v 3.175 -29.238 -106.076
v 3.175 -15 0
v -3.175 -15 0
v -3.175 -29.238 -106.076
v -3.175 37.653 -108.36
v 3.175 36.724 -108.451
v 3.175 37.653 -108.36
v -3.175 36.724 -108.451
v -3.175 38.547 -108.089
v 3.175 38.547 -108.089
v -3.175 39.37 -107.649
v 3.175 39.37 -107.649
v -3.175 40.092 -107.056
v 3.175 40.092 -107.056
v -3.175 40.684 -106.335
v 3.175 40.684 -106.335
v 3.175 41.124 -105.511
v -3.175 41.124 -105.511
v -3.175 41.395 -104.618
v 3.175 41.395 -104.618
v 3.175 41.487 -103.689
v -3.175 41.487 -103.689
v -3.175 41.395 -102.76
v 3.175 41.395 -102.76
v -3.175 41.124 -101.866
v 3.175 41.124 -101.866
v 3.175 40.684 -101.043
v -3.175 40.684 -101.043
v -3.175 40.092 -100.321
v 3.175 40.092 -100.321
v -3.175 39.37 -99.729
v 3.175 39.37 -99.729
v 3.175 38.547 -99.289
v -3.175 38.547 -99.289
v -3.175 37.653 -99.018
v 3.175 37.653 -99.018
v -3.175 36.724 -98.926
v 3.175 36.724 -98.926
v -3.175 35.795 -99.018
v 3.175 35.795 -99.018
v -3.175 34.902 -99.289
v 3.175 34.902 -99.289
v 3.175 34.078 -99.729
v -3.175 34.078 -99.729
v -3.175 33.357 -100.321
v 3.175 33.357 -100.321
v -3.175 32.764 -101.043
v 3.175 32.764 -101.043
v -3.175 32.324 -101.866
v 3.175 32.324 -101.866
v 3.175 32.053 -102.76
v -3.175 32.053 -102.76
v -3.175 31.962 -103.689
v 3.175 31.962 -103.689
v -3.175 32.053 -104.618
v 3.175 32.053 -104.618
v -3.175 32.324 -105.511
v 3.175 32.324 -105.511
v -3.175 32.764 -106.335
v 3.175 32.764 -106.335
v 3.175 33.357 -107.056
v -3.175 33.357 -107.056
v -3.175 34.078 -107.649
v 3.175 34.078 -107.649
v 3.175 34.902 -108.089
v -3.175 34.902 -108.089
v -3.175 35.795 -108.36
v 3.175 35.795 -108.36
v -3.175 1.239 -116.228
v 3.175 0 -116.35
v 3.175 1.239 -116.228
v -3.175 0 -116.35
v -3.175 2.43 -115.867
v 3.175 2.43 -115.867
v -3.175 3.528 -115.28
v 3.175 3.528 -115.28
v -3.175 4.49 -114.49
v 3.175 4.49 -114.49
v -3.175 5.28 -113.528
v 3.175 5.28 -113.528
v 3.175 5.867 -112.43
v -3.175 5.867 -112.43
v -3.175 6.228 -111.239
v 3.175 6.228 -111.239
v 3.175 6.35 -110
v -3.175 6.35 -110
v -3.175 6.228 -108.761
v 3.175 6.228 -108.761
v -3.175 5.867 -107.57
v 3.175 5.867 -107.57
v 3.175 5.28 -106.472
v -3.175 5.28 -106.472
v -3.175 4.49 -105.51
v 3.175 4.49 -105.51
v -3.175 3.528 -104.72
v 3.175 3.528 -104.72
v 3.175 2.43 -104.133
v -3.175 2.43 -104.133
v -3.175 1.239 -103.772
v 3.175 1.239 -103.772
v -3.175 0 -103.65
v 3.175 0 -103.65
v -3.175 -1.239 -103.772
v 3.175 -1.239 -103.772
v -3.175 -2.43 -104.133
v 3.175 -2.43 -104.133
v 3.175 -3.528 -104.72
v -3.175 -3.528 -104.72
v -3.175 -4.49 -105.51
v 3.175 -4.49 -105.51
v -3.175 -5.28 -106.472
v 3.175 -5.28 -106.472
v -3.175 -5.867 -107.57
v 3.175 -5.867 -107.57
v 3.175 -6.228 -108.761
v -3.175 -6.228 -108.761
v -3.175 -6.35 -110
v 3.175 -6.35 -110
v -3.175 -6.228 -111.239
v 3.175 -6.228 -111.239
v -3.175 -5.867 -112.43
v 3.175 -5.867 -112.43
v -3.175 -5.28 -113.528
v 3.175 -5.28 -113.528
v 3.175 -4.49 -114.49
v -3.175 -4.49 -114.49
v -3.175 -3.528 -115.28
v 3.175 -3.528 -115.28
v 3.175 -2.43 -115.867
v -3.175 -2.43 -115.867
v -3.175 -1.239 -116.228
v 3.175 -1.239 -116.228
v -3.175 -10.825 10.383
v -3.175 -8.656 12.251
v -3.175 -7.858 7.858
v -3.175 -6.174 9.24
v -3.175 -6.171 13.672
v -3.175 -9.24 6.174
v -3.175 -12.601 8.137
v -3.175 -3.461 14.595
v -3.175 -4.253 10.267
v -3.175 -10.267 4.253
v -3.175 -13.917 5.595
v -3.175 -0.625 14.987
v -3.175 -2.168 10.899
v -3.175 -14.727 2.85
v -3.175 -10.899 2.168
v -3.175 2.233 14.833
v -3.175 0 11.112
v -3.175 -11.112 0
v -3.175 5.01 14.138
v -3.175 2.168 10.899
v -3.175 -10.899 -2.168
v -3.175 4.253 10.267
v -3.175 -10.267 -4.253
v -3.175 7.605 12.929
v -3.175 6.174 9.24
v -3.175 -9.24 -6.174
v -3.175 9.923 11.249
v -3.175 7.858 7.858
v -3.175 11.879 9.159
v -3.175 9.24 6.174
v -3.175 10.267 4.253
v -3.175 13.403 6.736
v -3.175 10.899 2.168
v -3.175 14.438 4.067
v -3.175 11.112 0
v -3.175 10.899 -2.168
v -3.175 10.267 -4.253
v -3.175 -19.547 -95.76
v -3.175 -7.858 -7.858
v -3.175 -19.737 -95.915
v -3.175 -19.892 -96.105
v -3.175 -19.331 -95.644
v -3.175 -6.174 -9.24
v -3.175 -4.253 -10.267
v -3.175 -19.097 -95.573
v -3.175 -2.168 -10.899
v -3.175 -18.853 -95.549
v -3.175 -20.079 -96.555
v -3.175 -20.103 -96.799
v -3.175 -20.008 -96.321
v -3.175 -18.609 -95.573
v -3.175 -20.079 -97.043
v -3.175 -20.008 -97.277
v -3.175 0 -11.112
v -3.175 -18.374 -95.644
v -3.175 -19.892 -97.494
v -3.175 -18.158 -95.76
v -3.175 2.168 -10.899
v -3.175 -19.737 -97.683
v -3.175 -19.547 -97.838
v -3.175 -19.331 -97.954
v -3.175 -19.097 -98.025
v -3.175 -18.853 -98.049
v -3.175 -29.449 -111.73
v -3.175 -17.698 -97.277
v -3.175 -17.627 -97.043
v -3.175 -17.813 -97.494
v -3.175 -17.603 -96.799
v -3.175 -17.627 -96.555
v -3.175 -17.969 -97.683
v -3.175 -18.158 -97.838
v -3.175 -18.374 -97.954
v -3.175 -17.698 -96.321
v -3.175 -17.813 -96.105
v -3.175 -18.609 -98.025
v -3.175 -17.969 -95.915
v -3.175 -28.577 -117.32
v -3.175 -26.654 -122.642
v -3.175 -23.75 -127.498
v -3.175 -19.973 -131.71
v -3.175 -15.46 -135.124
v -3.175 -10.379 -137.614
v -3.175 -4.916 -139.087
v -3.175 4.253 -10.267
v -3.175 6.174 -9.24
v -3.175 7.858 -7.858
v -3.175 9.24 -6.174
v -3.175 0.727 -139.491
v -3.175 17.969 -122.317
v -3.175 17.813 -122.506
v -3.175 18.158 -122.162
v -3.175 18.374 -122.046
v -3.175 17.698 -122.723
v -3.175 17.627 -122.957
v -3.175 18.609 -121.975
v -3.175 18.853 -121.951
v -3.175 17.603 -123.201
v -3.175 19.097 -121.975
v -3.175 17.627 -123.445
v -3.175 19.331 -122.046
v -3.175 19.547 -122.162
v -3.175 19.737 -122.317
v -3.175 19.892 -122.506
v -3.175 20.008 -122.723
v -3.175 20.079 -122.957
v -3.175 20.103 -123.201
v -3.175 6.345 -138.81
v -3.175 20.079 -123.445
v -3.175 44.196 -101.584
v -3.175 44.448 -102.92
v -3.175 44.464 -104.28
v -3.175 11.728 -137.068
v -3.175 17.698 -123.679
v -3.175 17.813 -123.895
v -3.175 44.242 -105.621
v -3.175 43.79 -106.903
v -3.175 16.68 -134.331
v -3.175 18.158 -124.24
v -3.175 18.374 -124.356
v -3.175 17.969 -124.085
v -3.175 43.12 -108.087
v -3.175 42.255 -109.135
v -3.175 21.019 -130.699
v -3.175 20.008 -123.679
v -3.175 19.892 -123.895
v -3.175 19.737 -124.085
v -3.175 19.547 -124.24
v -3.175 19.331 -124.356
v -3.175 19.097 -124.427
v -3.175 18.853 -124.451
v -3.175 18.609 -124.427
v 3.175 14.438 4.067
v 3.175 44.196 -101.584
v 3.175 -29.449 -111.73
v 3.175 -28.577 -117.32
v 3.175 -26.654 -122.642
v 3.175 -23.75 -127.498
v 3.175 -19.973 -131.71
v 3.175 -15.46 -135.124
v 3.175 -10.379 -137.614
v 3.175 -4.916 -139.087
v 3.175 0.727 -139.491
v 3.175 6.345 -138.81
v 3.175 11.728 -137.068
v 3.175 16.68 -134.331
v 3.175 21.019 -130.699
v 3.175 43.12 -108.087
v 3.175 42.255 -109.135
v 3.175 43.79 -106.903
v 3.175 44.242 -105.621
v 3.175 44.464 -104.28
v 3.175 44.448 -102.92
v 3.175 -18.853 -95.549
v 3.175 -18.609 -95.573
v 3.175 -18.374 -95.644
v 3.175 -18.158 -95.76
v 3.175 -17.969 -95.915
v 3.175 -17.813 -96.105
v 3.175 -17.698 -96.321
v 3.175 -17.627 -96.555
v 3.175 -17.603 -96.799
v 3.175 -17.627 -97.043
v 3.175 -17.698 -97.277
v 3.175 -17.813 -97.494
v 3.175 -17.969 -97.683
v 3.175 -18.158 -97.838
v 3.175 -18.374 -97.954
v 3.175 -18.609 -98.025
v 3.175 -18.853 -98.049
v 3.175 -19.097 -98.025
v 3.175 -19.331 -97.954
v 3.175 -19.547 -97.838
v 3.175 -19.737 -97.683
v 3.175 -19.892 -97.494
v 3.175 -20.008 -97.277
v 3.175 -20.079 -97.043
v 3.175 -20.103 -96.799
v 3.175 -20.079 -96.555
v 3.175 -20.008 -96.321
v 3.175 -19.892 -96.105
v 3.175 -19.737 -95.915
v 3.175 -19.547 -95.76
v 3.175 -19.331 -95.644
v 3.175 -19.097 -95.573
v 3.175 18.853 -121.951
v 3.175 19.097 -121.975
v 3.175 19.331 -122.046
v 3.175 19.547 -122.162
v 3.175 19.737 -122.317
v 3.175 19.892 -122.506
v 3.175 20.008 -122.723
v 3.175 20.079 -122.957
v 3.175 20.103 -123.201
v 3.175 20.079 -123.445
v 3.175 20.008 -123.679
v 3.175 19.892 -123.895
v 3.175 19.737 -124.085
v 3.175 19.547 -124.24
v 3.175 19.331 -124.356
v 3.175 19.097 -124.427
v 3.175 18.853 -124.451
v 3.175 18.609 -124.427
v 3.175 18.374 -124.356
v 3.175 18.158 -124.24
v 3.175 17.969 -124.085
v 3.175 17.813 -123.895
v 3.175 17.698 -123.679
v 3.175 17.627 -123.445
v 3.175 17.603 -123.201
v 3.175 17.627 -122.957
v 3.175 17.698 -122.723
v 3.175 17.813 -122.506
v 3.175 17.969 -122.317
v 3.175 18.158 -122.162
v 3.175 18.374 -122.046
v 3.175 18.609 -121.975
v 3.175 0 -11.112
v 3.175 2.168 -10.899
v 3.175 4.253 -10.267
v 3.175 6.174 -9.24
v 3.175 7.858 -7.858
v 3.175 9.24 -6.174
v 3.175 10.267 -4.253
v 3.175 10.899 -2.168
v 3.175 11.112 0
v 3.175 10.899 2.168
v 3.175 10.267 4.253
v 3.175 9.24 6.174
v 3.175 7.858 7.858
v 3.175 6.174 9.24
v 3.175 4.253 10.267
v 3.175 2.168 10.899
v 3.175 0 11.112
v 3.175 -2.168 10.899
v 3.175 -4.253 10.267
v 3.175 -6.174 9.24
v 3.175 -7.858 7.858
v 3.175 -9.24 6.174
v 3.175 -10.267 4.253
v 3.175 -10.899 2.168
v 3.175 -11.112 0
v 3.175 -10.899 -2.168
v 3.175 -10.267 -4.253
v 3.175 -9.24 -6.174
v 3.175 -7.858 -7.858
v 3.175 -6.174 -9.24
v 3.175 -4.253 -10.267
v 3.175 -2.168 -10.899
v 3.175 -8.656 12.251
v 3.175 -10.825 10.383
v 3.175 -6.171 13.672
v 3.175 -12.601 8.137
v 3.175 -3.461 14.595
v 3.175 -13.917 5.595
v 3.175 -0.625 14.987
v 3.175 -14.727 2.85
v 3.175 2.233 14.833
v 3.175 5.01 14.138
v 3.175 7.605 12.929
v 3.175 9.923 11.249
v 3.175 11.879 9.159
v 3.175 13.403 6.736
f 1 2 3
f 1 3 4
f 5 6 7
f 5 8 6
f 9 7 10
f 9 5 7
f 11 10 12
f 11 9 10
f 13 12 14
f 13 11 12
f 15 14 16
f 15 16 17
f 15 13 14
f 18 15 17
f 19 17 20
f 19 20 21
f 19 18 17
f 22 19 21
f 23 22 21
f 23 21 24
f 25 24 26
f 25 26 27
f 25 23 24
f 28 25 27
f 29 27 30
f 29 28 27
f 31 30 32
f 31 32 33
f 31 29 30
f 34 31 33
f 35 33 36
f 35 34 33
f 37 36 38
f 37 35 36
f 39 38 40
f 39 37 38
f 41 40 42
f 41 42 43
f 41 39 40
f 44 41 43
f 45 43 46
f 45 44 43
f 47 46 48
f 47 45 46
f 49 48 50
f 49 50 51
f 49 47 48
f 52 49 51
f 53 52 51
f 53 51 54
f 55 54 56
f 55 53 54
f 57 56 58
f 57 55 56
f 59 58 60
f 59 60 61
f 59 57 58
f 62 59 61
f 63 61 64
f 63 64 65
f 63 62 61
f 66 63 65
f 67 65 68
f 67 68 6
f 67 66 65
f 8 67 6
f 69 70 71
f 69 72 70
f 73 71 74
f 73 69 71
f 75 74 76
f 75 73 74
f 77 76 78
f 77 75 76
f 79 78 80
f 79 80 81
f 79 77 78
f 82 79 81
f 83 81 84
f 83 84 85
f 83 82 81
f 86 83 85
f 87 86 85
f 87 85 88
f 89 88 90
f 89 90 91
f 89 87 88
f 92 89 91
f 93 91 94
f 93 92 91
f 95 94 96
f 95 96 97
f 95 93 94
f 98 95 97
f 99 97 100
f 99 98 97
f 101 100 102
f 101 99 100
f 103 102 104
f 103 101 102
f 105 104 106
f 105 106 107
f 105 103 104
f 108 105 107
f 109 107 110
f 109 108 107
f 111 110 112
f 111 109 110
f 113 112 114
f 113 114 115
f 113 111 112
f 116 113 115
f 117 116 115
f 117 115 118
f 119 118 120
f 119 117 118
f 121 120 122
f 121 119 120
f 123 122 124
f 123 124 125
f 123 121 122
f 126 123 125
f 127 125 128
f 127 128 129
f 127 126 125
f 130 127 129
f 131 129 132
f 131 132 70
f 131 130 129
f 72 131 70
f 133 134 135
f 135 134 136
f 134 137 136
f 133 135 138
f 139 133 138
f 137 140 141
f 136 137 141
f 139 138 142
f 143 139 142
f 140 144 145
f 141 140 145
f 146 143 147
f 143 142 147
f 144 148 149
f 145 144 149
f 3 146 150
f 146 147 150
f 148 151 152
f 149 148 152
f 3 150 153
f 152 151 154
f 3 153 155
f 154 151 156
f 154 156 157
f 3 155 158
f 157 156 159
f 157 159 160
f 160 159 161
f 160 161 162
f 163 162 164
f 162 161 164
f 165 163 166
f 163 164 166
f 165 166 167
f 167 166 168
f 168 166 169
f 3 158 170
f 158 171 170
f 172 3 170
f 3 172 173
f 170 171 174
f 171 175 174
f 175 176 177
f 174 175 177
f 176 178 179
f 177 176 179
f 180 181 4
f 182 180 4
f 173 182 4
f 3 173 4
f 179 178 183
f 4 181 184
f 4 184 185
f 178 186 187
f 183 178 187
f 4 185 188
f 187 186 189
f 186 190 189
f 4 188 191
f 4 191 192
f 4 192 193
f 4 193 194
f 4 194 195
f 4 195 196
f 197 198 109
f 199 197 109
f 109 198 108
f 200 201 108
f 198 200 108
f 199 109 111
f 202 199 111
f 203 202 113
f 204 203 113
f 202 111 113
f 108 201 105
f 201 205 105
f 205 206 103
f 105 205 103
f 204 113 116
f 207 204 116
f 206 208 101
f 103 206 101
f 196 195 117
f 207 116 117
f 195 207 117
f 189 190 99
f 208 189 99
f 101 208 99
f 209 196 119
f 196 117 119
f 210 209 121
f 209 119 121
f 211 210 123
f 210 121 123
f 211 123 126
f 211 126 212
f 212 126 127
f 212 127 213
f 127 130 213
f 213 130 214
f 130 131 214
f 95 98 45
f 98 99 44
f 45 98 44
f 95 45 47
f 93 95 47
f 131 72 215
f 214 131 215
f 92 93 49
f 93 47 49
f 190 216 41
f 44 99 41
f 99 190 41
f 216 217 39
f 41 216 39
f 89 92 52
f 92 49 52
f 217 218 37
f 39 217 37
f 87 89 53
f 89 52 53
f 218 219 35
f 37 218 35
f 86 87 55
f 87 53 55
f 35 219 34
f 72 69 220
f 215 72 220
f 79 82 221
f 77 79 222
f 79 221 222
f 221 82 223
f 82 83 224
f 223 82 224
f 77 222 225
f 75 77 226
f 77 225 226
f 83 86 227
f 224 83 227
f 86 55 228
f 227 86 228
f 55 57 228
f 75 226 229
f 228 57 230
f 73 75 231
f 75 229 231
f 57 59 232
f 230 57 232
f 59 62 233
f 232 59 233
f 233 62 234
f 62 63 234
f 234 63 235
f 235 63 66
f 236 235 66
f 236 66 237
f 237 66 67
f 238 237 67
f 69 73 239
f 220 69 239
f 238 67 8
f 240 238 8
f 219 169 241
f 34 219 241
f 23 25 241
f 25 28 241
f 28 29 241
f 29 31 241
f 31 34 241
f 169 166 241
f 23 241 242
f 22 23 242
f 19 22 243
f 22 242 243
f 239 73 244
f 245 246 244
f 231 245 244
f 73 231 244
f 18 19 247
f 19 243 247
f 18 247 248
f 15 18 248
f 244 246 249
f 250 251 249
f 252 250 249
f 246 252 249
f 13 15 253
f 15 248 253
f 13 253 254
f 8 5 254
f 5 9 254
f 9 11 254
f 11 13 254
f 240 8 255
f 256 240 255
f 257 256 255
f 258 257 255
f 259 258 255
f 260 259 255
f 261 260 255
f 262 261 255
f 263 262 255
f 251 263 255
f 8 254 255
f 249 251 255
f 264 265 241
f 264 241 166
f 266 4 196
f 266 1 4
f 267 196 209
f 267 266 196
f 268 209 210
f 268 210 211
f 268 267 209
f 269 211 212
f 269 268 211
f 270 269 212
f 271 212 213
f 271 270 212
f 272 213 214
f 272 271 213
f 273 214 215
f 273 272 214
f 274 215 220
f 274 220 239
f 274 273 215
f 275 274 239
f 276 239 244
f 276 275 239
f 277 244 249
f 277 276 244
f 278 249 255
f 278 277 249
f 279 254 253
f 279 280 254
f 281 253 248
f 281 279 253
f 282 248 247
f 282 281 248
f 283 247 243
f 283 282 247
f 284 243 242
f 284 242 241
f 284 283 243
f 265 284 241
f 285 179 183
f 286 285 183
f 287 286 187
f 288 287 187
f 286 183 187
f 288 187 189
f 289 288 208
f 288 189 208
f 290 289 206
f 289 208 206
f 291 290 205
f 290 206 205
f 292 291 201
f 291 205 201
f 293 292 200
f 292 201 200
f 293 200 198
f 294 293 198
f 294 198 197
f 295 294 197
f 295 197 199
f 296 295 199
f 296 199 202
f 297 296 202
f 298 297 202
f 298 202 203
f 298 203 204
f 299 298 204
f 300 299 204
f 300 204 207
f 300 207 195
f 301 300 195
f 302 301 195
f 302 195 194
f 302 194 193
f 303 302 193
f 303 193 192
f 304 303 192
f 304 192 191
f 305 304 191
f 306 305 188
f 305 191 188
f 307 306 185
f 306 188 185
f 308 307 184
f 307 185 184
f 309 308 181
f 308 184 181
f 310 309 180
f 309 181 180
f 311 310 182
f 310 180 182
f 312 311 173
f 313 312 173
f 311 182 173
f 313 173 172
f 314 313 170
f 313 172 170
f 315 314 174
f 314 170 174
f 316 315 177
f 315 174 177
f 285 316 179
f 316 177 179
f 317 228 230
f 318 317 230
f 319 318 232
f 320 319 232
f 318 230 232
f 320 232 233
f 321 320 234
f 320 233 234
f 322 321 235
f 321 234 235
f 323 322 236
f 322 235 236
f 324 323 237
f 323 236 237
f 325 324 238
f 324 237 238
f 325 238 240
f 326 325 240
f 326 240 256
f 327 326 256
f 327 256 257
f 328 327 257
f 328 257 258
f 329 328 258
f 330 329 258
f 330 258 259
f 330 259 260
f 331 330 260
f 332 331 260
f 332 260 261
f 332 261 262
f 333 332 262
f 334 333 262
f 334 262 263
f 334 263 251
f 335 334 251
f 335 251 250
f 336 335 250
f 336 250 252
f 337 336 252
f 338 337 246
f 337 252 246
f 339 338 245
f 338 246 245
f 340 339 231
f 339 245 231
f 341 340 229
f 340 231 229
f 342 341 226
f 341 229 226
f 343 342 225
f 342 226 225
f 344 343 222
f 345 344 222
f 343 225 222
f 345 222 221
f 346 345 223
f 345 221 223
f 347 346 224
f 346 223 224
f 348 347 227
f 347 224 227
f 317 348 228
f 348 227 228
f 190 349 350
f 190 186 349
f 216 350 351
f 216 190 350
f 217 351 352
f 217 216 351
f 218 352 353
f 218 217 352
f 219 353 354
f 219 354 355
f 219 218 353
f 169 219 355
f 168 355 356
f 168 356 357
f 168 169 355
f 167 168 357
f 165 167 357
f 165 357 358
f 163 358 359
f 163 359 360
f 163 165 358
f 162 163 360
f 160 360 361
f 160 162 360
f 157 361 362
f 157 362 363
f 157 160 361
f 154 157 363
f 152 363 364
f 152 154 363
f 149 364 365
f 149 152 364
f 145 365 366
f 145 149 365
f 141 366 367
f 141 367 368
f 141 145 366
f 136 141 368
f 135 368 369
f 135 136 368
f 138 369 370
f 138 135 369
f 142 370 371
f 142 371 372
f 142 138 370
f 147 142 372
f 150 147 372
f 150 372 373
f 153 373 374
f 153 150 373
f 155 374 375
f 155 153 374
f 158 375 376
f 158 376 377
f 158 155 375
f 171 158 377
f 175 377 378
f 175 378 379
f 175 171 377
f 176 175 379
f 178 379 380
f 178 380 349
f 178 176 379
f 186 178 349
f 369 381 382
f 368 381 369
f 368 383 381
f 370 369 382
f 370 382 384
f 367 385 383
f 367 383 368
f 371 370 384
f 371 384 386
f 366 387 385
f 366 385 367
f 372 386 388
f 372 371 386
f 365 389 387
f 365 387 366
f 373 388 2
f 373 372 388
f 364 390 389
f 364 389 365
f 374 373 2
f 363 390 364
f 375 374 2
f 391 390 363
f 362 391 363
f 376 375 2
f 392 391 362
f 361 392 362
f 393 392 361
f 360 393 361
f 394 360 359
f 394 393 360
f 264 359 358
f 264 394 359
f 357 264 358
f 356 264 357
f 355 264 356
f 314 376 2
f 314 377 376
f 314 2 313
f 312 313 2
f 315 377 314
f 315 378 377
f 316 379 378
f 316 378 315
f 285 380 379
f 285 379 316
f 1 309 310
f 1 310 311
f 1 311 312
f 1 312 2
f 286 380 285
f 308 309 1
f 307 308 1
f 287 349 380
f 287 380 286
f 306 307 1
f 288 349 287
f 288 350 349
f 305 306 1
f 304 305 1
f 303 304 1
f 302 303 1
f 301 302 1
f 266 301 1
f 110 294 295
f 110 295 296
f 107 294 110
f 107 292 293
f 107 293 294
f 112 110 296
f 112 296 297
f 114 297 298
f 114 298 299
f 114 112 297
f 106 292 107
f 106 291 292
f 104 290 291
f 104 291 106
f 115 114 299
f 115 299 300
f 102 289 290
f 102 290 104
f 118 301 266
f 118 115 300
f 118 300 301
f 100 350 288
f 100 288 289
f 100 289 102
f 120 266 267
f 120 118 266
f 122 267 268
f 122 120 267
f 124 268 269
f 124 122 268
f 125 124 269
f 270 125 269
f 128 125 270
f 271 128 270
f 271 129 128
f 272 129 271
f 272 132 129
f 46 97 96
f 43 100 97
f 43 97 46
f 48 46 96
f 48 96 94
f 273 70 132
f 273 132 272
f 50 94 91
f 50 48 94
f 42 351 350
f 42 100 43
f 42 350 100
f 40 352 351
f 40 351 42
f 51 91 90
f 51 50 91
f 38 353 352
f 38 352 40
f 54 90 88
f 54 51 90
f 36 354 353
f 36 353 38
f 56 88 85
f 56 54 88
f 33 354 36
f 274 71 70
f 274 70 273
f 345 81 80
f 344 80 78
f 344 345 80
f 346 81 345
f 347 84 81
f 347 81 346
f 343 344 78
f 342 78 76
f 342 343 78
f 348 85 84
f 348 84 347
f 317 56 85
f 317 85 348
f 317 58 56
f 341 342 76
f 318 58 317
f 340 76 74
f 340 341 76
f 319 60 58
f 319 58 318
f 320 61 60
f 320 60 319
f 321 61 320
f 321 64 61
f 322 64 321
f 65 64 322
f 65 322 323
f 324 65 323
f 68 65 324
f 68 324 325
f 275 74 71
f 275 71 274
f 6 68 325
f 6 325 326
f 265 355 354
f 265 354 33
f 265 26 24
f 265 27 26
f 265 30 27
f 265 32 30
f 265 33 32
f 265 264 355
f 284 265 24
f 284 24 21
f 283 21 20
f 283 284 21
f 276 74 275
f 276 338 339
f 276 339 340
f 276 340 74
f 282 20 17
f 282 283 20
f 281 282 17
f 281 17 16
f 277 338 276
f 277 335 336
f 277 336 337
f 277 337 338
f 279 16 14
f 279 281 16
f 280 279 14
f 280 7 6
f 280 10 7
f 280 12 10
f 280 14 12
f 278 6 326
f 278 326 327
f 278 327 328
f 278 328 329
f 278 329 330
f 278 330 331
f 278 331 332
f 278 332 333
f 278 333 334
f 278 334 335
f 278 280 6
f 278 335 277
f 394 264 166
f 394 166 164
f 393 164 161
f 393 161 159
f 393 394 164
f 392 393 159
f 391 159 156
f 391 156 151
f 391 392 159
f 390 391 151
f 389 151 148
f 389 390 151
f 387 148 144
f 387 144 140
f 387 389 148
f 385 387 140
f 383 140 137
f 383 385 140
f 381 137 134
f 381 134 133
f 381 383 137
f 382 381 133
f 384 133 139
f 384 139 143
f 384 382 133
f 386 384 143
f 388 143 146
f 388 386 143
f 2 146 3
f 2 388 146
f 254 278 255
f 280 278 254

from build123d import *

# Parameters (mm, degrees)
SKETCH1_R             = 11.1125
SKETCH1_R_2           = 6.35
SKETCH1_R_3           = 4.7625
BOSS_EXTRUDE1_DEPTH   = 3.175
M3X0_5_TAPPED_HOLE1_D = 2.5


with BuildPart() as part:
    # Sketch1 → Boss-Extrude1 (new, symmetric)
    with BuildSketch(Plane(origin=(0, 0, 0), x_dir=(0, 0, -1), z_dir=(1, 0, 0))):
        with BuildLine():
            ThreePointArc((109.135384069, 42.254910239), (105.621138378, 44.242227481), (101.584158555, 44.195897144))
            Line((101.584158555, 44.195897144), (-4.066677309, 14.438217884))
            ThreePointArc((-4.066677309, 14.438217884), (-14.858890744, -2.052648501), (0, -15))
            Line((0, -15), (106.075609583, -29.237803609))
            ThreePointArc((106.075609583, -29.237803609), (136.491140548, -12.979579055), (130.699290202, 21.018786481))
            Line((130.699290202, 21.018786481), (109.135384069, 42.254910239))
        make_face()
        Circle(SKETCH1_R, mode=Mode.SUBTRACT)
        with Locations((110, 0)):
            Circle(SKETCH1_R_2, mode=Mode.SUBTRACT)
        with Locations((103.688664063, 36.724119389)):
            Circle(SKETCH1_R_3, mode=Mode.SUBTRACT)
    extrude(amount=BOSS_EXTRUDE1_DEPTH, both=True)

    # M3x0.5 Tapped Hole1 (through all)
    with Locations(Plane(origin=(3.175, 0, 0), x_dir=(0, 0, -1), z_dir=(1, 0, 0))):
        with Locations((123.200861683, 18.852784299), (110, 0), (96.799138317, -18.852784299)):
            Hole(M3X0_5_TAPPED_HOLE1_D / 2)


solid = part.part
